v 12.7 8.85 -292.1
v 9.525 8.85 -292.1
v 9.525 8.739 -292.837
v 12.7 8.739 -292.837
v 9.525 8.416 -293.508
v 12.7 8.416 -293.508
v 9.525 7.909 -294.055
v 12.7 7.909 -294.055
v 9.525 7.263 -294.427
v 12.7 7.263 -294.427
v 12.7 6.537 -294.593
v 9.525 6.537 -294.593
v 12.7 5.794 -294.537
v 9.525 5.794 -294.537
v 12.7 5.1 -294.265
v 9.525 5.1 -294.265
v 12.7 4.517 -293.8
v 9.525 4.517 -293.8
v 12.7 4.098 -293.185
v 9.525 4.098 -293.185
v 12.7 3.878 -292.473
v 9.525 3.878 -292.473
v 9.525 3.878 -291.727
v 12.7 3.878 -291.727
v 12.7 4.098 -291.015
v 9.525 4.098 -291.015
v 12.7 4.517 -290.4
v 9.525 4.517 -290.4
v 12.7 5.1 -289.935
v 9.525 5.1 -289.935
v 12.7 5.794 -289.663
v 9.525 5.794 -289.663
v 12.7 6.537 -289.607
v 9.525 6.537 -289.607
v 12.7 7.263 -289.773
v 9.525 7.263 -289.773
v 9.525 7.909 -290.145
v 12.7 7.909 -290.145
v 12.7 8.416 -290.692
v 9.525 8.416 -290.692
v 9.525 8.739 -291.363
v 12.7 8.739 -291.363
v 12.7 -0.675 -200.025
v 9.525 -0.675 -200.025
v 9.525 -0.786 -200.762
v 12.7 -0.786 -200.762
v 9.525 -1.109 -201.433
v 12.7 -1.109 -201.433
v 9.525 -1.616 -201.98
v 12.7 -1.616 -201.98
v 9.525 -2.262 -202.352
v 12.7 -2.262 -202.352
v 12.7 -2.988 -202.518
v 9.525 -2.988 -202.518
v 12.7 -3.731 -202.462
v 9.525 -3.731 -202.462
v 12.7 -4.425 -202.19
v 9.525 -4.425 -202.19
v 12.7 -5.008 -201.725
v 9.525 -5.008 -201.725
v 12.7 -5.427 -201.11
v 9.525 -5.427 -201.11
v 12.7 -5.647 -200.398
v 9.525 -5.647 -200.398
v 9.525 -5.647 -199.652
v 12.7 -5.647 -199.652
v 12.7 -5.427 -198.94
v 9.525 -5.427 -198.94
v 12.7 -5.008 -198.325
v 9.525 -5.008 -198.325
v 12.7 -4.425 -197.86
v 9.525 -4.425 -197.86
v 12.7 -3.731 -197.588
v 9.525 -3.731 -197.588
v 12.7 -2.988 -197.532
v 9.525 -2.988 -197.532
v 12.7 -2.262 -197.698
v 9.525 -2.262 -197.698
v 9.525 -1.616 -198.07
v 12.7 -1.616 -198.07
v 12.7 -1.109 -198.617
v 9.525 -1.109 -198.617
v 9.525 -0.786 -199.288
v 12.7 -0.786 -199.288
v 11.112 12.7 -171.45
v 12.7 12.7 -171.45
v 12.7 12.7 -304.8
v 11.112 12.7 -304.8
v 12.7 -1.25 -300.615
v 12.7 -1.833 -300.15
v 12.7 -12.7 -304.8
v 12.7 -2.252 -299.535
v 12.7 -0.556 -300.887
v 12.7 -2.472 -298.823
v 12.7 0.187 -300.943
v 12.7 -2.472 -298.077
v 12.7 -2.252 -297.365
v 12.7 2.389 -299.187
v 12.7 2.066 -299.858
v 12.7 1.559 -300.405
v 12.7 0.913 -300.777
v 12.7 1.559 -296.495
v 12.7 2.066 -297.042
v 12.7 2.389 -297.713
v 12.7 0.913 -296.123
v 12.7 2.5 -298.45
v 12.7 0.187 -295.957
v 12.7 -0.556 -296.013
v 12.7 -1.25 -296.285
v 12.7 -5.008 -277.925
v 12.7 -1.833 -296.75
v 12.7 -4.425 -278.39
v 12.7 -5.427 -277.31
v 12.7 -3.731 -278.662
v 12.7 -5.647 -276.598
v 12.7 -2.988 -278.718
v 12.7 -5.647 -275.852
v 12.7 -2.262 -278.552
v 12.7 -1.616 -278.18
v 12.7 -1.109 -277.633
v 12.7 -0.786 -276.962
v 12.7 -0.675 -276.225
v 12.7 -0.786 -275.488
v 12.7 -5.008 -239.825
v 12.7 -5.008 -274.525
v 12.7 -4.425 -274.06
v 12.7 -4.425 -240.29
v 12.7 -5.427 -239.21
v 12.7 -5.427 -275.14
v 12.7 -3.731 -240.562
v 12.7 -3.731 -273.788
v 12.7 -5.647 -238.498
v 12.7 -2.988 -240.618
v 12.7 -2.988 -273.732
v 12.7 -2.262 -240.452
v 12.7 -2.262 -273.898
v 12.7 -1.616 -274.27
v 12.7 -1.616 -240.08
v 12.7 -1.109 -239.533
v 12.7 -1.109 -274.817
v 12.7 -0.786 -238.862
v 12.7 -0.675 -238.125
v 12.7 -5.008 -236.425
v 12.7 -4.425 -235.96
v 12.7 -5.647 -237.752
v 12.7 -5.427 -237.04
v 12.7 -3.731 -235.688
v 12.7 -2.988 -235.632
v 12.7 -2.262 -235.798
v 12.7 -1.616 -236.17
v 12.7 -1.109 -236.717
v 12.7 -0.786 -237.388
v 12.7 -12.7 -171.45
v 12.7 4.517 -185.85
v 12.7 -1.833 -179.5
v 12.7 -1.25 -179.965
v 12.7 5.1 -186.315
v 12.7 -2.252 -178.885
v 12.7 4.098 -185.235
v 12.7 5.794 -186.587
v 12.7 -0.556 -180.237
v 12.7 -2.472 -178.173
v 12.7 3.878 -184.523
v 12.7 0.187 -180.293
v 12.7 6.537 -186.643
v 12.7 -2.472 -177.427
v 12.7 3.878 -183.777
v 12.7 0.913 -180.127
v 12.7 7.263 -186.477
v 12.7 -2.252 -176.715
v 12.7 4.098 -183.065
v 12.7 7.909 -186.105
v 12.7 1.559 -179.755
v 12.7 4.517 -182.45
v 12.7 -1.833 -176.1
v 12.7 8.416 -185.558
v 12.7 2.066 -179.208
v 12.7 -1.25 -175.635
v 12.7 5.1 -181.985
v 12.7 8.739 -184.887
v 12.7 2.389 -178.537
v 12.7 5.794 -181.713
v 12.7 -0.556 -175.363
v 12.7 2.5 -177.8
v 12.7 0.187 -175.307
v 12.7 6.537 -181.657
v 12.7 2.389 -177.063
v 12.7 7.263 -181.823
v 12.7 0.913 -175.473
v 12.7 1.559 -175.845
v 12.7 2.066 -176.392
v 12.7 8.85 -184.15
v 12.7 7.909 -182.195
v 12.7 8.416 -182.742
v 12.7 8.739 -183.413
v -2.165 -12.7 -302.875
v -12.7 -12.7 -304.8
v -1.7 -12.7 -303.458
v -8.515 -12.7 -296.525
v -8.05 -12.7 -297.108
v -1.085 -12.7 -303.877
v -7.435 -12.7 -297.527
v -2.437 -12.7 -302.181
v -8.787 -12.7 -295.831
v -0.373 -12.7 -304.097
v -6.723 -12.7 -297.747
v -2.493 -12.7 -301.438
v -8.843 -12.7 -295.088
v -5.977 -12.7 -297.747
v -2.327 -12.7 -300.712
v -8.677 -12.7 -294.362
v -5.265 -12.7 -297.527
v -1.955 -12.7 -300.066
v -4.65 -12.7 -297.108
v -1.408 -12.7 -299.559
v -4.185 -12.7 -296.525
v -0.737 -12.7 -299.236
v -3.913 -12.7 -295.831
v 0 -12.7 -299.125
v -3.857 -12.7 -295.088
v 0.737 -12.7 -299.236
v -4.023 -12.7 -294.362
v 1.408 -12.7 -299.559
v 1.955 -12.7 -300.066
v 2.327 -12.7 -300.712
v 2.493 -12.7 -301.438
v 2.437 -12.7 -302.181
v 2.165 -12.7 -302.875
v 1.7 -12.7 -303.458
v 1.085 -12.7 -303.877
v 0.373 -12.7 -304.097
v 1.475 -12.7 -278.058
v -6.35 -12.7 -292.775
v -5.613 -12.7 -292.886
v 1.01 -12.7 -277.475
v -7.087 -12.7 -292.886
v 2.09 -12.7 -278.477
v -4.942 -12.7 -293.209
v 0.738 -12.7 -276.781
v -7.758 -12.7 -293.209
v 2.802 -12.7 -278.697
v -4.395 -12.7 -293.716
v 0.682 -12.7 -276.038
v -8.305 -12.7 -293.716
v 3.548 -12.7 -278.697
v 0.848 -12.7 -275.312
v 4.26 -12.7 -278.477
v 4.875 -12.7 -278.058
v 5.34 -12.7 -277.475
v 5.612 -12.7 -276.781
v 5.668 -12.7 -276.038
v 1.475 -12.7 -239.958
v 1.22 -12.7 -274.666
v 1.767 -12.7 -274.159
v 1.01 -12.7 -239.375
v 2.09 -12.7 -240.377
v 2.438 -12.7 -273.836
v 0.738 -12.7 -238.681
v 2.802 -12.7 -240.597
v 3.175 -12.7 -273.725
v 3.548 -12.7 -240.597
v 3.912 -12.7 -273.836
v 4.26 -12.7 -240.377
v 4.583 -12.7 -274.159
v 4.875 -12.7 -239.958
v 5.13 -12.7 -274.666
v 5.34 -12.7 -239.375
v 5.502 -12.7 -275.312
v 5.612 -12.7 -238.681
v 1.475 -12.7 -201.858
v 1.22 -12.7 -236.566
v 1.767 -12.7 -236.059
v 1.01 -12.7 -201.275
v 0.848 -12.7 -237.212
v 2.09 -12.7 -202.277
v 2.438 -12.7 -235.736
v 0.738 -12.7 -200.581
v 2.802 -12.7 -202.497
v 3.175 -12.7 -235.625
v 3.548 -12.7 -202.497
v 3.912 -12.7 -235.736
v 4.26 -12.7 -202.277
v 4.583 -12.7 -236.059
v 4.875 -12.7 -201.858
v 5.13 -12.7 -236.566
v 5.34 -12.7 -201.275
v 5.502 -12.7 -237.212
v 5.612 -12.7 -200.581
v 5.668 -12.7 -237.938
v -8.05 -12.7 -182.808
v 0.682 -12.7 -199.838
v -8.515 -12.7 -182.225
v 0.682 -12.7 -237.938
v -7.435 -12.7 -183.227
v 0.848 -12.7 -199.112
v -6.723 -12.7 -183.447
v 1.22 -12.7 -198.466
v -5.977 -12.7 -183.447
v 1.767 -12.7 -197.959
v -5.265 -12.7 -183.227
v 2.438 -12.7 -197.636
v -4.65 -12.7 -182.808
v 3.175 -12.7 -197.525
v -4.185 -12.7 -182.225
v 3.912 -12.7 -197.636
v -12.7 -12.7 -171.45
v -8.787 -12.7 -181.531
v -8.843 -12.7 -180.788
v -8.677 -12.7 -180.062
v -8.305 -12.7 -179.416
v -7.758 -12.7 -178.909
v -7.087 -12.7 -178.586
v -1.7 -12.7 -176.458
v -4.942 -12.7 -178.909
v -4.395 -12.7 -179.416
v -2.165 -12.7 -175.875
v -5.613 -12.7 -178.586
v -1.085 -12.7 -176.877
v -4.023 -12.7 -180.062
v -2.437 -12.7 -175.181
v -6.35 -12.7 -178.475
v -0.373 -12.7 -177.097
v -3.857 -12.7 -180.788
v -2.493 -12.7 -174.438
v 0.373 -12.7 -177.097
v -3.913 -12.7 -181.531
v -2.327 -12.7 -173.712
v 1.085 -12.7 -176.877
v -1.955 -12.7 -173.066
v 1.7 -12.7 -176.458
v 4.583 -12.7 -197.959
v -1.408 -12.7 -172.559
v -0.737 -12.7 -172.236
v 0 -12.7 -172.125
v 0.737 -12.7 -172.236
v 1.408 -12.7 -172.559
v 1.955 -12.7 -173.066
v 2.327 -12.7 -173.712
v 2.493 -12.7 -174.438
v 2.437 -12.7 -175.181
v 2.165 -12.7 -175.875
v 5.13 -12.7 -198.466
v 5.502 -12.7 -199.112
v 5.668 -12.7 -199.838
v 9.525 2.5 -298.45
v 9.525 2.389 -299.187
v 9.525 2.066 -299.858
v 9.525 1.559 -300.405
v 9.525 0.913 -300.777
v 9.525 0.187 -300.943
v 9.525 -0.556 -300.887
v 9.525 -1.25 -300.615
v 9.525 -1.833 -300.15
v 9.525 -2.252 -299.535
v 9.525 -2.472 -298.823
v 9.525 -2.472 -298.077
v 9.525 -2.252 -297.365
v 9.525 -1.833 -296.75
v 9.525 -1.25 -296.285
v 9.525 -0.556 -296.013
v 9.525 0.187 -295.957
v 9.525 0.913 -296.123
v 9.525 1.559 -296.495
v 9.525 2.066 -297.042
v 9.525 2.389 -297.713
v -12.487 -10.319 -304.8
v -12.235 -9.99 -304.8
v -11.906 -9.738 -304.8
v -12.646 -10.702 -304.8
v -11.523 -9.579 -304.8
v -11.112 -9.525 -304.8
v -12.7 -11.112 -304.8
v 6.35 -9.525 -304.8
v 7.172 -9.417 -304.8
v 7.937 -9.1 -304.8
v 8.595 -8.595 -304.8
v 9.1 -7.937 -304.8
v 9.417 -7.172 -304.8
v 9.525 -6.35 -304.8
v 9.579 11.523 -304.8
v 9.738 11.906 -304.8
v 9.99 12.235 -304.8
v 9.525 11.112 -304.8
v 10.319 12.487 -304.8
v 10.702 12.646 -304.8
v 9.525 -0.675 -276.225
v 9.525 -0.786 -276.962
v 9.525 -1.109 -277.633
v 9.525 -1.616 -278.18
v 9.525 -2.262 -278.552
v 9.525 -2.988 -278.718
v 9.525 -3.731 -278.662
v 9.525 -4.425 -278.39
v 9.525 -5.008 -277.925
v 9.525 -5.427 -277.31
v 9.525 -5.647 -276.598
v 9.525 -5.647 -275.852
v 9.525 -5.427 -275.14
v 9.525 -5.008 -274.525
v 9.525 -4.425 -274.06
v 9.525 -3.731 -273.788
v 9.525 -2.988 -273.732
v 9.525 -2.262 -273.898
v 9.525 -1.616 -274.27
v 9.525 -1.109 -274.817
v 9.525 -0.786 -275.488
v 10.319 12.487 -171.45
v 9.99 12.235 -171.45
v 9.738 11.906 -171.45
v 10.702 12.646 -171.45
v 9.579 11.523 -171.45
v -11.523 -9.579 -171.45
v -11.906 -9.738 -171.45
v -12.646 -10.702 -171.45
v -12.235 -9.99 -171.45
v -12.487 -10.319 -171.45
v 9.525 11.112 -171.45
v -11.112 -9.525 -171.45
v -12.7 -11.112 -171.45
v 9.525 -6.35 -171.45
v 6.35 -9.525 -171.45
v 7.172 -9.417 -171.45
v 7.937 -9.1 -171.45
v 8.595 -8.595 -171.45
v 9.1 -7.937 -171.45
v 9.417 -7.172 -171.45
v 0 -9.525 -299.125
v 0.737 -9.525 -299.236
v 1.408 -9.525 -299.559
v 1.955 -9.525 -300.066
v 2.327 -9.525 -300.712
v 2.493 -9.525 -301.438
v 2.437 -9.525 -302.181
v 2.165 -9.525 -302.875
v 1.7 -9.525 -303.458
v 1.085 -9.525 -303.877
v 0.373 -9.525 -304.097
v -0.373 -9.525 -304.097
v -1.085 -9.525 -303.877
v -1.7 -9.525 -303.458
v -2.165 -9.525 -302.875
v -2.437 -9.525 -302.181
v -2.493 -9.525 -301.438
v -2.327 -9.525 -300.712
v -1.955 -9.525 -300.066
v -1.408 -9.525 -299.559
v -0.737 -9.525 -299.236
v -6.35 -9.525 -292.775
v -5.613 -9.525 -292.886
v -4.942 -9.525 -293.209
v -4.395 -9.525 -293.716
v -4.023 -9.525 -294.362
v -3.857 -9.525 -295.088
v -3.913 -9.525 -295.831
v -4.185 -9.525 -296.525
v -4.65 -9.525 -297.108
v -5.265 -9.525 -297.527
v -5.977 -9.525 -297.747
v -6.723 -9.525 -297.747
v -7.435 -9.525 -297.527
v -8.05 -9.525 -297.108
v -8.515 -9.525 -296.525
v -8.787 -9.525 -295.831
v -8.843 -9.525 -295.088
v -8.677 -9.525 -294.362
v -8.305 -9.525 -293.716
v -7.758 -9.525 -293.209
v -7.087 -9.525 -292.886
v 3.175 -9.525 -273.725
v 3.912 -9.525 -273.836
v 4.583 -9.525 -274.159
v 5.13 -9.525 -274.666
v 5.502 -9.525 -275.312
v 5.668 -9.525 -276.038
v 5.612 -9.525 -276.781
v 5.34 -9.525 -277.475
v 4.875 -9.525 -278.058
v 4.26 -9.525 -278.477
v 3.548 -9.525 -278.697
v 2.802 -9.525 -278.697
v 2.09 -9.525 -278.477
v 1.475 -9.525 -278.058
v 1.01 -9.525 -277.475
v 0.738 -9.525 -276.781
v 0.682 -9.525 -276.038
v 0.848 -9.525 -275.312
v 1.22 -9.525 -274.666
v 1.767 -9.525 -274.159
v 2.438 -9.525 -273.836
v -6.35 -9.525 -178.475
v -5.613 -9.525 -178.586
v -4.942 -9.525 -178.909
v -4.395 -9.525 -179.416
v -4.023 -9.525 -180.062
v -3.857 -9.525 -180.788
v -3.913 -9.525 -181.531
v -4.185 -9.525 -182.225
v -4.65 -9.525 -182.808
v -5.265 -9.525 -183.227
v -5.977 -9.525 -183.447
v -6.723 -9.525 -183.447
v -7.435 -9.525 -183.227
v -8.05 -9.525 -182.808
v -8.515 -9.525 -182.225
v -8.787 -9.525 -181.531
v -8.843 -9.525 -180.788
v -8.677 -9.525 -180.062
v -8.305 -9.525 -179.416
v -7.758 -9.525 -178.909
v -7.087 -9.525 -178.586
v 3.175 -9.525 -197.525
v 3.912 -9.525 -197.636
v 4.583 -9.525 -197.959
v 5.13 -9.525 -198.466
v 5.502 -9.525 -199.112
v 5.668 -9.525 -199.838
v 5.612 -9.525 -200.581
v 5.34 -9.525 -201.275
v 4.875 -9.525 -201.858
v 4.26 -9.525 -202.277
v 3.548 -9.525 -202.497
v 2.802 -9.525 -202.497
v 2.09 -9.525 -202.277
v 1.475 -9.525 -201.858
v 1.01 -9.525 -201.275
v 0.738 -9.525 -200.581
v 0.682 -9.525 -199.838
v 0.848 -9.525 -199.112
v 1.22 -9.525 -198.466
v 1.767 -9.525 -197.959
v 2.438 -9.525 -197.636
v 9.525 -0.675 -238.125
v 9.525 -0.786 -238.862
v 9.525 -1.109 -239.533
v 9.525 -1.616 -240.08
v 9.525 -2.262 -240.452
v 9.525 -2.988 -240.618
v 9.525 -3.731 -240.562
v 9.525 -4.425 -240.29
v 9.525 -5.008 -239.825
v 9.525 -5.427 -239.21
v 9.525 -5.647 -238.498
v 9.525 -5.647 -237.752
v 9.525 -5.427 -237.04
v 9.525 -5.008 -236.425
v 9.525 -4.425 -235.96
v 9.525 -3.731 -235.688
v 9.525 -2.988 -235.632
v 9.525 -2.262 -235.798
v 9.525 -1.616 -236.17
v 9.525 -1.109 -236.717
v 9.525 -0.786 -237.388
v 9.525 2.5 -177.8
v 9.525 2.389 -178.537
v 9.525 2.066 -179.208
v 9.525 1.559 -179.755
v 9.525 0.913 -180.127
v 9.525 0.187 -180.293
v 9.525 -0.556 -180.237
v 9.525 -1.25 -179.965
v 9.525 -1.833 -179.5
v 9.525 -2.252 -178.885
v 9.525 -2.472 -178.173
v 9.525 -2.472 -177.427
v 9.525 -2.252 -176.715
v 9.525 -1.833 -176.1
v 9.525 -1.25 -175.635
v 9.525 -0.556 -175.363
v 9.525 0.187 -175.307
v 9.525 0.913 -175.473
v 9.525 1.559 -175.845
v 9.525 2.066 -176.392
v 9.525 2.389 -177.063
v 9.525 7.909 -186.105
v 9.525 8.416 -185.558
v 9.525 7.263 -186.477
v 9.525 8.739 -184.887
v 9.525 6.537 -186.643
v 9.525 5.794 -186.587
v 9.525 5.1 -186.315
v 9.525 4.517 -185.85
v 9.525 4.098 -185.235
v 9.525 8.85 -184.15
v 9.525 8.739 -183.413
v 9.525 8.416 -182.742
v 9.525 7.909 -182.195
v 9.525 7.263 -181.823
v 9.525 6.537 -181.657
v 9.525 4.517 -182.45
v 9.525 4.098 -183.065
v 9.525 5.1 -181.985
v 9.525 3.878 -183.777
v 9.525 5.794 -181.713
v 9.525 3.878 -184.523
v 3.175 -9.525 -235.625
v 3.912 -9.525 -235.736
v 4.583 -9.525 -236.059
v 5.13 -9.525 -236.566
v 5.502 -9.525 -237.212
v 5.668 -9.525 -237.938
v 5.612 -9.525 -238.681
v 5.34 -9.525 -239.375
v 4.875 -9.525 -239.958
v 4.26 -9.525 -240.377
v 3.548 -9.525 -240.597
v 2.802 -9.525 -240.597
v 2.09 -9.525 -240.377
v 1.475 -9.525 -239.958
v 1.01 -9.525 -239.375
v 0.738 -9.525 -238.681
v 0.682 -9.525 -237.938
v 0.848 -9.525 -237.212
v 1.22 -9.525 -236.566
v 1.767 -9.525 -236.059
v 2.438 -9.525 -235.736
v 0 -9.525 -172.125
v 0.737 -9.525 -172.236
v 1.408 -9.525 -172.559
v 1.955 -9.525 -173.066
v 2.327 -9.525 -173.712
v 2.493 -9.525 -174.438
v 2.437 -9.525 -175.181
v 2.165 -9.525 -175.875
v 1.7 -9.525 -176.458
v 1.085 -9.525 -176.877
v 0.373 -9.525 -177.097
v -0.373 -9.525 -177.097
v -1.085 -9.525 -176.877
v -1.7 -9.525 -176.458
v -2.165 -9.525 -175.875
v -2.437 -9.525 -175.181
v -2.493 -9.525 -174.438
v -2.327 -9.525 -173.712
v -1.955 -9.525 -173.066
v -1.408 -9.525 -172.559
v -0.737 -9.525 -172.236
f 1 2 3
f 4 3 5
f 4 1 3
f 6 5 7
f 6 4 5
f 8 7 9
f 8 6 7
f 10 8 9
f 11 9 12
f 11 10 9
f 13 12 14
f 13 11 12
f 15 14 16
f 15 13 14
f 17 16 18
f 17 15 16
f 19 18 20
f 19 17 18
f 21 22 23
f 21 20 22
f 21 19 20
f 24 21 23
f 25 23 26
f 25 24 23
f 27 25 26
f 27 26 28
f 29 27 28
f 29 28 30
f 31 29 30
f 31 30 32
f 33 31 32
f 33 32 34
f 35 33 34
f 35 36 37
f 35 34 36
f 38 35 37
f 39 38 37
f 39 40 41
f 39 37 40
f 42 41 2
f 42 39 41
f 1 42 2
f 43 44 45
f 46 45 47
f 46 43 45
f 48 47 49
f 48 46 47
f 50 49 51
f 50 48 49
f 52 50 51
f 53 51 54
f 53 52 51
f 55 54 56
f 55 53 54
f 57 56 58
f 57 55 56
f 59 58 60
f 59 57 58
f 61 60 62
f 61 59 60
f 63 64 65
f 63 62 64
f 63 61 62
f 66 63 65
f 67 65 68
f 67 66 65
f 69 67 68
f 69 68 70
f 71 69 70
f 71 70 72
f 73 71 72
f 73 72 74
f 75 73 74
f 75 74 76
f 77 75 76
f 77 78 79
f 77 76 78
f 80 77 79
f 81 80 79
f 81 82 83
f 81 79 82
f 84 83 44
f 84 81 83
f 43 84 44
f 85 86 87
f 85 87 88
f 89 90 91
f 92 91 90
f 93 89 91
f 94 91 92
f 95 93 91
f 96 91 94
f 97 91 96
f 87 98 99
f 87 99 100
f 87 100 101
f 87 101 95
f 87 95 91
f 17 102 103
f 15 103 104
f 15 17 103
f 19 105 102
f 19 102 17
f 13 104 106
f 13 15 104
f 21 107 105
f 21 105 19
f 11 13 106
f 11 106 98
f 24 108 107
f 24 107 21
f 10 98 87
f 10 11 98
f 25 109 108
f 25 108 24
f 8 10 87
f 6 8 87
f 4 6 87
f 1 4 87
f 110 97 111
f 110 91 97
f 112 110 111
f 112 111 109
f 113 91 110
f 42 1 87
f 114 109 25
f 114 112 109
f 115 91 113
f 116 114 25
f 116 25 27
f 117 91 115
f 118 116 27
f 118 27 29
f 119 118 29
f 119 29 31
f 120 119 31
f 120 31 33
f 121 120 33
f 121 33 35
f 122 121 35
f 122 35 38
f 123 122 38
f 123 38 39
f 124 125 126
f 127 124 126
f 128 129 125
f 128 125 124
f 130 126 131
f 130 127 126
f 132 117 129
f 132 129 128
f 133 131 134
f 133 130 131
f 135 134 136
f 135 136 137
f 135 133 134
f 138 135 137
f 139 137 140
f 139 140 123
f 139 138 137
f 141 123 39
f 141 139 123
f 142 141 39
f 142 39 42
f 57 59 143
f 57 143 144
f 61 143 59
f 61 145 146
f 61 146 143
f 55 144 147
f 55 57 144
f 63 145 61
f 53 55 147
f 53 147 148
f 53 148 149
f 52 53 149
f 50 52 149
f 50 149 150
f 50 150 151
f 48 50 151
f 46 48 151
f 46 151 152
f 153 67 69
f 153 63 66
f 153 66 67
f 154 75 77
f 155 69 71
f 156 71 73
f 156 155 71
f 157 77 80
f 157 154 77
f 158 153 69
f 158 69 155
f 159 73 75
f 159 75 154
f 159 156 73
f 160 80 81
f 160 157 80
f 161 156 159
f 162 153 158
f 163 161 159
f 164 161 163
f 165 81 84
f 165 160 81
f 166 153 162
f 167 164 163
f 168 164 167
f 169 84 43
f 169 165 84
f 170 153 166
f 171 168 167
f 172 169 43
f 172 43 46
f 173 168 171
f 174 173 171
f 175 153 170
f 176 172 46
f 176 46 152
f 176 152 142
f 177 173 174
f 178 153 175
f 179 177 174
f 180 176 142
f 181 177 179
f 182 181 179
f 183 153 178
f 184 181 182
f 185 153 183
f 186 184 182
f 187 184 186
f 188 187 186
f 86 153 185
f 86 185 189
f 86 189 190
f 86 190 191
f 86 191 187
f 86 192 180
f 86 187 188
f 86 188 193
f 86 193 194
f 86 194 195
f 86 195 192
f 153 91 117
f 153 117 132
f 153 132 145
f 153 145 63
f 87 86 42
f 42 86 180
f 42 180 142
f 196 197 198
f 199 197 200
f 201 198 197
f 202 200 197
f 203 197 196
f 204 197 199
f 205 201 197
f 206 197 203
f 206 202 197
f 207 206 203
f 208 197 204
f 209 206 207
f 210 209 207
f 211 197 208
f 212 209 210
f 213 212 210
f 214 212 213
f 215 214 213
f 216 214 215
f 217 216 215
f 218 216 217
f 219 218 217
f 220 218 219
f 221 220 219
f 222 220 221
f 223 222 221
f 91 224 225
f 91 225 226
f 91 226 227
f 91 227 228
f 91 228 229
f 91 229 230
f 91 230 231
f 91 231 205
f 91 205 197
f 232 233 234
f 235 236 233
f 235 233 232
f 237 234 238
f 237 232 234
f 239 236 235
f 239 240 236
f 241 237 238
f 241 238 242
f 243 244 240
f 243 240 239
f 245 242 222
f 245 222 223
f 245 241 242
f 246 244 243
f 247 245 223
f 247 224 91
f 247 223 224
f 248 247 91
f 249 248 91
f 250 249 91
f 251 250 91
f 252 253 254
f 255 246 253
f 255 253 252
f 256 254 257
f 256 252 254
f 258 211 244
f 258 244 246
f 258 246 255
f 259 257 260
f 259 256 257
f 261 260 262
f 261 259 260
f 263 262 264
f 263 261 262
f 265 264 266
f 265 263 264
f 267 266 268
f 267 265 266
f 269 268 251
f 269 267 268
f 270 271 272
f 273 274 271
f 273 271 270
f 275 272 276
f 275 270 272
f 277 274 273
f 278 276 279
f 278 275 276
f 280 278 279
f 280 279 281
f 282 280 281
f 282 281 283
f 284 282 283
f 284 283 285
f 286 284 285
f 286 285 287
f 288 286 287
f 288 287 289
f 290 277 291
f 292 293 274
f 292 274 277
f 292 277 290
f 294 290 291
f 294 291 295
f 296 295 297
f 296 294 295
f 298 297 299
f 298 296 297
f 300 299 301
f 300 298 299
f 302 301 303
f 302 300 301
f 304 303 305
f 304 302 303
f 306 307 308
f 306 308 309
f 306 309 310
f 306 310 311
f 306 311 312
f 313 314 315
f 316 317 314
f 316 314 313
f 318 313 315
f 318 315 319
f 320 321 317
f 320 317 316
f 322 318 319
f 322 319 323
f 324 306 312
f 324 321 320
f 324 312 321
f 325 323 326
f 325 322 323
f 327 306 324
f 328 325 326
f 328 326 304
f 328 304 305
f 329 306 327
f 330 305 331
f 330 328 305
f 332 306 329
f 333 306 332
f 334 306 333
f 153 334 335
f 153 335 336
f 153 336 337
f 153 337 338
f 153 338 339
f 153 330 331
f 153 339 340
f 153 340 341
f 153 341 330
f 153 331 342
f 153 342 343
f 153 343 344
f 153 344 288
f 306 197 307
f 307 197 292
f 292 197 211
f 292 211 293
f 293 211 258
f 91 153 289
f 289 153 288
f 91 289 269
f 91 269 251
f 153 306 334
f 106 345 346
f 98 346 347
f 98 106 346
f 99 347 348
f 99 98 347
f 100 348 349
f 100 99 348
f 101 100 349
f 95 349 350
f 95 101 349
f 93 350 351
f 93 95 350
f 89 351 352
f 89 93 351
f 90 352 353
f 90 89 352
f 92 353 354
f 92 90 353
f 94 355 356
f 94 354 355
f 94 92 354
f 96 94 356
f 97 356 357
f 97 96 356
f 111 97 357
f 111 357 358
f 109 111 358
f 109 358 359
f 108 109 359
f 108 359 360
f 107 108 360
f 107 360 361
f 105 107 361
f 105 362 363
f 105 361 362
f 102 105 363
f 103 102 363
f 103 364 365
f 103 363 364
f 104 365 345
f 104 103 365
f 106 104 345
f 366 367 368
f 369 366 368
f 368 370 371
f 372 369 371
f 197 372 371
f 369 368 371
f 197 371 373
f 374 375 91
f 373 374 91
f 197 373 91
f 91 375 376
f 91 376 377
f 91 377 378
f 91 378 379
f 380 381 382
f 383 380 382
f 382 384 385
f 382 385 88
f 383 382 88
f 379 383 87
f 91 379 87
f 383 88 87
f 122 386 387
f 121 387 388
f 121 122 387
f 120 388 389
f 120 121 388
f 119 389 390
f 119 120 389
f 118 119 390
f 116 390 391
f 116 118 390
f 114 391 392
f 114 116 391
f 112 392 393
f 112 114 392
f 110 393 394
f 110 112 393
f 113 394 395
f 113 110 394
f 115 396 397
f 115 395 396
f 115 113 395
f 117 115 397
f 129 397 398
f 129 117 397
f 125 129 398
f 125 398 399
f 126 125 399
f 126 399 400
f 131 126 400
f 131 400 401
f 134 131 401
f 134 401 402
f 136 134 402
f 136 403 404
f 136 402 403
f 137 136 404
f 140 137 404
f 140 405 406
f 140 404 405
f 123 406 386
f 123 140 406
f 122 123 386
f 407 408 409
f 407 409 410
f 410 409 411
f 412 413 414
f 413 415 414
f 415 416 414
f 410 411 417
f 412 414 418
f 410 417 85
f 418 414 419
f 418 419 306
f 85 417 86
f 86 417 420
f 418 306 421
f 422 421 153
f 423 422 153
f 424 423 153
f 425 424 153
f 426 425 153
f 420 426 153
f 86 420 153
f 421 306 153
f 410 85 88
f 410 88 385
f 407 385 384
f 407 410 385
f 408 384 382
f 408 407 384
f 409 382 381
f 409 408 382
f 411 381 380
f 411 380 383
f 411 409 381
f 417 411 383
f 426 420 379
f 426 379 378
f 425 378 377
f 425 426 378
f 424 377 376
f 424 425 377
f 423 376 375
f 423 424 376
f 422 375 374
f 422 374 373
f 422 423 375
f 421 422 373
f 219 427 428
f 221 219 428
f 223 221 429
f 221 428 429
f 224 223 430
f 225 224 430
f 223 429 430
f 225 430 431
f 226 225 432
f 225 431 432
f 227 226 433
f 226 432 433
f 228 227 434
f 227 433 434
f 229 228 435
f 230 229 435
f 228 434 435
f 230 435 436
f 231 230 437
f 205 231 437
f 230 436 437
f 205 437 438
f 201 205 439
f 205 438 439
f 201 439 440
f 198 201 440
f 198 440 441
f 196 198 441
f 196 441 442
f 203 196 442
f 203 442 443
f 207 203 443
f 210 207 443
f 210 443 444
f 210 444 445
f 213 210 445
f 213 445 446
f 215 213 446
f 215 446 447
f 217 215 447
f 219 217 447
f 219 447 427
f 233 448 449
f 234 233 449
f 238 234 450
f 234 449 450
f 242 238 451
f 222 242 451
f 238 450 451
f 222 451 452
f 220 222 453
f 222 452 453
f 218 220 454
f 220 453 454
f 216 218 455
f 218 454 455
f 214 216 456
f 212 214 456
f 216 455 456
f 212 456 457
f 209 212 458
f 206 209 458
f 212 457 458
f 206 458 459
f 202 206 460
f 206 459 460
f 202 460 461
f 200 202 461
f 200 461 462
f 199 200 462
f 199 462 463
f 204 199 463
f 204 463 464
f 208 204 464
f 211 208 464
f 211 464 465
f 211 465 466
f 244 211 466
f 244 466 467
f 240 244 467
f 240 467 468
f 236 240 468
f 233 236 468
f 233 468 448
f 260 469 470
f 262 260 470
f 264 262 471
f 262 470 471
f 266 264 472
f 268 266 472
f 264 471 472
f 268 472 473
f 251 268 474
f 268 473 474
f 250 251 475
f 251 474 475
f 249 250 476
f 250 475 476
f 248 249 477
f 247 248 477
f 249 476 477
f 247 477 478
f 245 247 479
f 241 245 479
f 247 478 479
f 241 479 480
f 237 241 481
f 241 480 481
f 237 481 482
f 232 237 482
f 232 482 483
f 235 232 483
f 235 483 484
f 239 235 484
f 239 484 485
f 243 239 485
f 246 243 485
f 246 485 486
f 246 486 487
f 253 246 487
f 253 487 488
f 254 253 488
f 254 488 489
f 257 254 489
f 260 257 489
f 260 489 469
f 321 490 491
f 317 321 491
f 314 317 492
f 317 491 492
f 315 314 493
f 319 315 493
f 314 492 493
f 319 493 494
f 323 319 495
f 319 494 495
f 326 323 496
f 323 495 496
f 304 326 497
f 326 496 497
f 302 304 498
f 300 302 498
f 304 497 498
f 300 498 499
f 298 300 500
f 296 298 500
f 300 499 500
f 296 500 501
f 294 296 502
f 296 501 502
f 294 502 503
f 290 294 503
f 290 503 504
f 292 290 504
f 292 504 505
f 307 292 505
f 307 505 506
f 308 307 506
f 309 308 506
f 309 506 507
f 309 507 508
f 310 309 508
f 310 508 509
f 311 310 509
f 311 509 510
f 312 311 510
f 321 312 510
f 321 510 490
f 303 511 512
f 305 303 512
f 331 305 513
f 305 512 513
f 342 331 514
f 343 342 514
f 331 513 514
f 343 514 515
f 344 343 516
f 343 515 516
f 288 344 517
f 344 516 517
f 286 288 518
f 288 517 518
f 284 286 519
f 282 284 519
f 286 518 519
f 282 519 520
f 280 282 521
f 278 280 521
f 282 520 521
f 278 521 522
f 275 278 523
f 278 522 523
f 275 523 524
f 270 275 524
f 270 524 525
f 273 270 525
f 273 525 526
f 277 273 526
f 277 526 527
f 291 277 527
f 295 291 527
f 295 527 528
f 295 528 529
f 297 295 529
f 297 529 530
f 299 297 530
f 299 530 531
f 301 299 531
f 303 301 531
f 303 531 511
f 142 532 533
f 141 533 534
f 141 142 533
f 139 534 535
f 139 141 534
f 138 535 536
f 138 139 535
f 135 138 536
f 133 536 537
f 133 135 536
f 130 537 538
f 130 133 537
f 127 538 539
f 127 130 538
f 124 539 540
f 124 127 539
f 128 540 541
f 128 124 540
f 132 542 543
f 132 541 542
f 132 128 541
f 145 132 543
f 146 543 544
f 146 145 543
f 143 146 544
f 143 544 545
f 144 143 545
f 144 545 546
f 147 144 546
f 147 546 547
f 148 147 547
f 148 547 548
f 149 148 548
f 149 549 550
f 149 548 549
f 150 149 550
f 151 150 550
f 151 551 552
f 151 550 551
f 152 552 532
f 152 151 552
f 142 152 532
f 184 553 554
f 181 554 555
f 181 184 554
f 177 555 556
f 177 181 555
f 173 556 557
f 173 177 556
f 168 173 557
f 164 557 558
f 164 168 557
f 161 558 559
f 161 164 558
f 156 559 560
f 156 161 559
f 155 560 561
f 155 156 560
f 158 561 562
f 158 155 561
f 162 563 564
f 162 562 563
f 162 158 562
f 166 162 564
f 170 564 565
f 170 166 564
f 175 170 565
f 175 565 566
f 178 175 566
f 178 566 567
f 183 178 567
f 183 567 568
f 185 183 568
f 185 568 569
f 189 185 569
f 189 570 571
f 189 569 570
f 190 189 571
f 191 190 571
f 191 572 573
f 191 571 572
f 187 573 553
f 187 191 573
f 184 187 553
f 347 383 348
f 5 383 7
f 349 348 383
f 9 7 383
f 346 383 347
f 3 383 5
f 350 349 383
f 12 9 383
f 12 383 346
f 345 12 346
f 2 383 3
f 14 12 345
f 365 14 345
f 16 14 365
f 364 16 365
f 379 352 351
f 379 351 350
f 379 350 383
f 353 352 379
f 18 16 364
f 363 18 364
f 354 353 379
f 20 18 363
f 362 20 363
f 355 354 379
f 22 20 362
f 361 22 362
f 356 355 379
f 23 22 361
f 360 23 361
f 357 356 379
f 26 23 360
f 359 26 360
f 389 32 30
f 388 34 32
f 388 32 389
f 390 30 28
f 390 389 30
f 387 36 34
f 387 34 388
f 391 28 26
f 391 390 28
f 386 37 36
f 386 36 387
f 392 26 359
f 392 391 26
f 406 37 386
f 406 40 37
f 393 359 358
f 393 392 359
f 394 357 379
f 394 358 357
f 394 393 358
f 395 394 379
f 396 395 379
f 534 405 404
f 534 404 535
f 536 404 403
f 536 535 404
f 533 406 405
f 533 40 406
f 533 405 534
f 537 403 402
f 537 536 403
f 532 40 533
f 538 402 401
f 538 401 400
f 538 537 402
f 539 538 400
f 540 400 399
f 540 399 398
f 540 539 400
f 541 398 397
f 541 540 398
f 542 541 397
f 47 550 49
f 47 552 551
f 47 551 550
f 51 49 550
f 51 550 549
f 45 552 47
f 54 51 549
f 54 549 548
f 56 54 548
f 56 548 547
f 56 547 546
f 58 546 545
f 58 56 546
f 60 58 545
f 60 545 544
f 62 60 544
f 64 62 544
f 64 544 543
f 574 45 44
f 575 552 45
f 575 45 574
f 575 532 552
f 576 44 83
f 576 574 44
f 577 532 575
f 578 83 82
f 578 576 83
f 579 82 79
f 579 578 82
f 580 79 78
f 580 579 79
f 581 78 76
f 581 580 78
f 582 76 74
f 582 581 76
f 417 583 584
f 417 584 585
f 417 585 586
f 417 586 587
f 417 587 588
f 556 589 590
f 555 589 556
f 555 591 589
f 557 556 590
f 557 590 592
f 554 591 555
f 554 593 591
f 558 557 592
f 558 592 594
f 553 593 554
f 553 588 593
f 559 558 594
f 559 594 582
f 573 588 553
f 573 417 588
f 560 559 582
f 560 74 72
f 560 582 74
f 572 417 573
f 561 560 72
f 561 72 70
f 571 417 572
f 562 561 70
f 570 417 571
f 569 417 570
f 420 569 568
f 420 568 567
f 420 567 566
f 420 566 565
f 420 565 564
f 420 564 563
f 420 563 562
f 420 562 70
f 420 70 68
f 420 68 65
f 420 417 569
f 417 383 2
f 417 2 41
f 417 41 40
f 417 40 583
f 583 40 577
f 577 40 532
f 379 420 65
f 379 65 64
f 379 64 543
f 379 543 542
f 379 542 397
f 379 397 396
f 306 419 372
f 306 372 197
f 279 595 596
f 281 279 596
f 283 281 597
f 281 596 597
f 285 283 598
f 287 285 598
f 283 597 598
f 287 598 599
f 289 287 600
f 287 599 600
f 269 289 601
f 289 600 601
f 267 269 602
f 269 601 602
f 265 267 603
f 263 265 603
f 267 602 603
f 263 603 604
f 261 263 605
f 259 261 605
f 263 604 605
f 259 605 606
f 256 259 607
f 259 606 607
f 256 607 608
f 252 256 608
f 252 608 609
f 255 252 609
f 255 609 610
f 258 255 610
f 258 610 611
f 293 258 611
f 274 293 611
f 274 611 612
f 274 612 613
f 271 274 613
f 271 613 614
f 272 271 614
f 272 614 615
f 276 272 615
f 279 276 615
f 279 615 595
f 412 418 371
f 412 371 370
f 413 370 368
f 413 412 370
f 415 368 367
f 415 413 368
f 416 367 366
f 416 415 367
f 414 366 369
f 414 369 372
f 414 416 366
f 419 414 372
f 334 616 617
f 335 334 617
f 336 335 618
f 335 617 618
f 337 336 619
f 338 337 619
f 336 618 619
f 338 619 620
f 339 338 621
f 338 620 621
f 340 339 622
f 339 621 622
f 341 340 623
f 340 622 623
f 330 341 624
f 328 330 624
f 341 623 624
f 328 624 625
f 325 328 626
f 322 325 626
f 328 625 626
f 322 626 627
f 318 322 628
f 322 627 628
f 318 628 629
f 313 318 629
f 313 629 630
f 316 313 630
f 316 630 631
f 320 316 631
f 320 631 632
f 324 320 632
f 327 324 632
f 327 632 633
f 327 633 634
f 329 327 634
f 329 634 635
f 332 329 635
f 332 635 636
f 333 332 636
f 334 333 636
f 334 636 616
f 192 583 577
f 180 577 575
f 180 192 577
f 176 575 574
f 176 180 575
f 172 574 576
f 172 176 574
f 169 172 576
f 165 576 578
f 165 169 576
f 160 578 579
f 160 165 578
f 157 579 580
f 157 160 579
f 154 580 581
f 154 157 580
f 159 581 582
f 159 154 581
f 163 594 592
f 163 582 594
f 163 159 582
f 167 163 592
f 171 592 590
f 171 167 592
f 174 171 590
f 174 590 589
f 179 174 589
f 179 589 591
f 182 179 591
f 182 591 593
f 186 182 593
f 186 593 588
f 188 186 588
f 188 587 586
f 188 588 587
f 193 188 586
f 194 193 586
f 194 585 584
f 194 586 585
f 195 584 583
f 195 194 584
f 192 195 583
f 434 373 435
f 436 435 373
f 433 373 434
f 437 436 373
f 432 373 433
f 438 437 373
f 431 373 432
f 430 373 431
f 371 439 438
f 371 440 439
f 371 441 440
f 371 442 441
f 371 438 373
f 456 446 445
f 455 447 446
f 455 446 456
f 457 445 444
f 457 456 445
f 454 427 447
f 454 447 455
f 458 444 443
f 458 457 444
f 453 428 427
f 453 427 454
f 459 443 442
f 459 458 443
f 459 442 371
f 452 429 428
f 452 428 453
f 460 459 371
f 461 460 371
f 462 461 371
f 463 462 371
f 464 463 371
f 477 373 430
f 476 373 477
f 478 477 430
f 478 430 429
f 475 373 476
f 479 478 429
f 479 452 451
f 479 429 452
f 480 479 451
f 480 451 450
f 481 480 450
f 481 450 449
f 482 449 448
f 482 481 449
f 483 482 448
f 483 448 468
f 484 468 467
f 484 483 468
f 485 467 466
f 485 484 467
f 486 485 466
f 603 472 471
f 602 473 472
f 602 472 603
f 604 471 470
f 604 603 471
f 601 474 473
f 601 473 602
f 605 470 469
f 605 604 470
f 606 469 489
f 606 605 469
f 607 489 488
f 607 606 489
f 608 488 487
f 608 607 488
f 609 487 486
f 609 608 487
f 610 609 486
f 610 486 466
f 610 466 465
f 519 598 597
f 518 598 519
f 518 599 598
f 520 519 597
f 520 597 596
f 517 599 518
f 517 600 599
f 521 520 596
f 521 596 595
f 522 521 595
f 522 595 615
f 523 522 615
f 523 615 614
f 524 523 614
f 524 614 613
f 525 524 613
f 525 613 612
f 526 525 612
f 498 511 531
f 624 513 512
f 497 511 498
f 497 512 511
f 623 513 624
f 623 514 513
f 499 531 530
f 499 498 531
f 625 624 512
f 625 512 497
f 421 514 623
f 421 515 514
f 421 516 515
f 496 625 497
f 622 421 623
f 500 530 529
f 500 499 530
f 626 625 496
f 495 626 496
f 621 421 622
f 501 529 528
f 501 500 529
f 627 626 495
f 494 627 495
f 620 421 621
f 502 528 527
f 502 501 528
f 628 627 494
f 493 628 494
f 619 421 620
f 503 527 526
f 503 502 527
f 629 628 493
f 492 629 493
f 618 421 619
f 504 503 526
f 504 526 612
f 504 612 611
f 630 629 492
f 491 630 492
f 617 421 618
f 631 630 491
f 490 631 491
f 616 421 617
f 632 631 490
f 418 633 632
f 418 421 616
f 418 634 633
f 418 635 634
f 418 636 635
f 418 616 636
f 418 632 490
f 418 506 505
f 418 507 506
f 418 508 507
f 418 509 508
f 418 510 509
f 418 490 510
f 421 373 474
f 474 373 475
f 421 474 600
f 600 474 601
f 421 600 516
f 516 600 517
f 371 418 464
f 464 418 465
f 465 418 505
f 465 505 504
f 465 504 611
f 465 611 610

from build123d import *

# Parameters (mm, degrees)
BOSS_EXTRUDE1_DEPTH = 304.8
SKETCH7_W           = 25.4
SKETCH7_H           = 476.25
CUT_EXTRUDE1_DEPTH  = 254
SKETCH3_R           = 2.5
CUT_EXTRUDE2_DEPTH  = 254
SKETCH8_R           = 2.5
CUT_EXTRUDE4_DEPTH  = 254


with BuildPart() as part:
    # Sketch2 → Boss-Extrude1 (new, symmetric)
    with BuildSketch(Plane.XY):
        with BuildLine():
            Line((-12.7, -12.7), (12.7, -12.7))
            Line((12.7, -12.7), (12.7, 12.7))
            Line((12.7, 12.7), (11.1125, 12.7))
            ThreePointArc((11.1125, 12.7), (9.989967985, 12.235032015), (9.525, 11.1125))
            Line((9.525, 11.1125), (9.525, -6.35))
            ThreePointArc((9.525, -6.35), (8.59506403, -8.59506403), (6.35, -9.525))
            Line((6.35, -9.525), (-11.1125, -9.525))
            ThreePointArc((-11.1125, -9.525), (-12.235032015, -9.989967985), (-12.7, -11.1125))
            Line((-12.7, -11.1125), (-12.7, -12.7))
        make_face()
    extrude(amount=BOSS_EXTRUDE1_DEPTH, both=True)

    # Sketch7 → Cut-Extrude1 (cut)
    with BuildSketch(Plane.XZ.offset(12.7)):
        with Locations((0, 66.675)):
            Rectangle(SKETCH7_W, SKETCH7_H)
    extrude(amount=-CUT_EXTRUDE1_DEPTH, mode=Mode.SUBTRACT)

    # Sketch3 → Cut-Extrude2 (cut)
    with BuildSketch(Plane(origin=(0, 0, 0), x_dir=(1, 0, 0), z_dir=(0, 1, 0))):
        with Locations(Location((-6.35, 295.275, 0), (0, 0, 270))):
            Circle(SKETCH3_R)
        with Locations(Location((0, 301.625, 0), (0, 0, 270))):
            Circle(SKETCH3_R)
        with Locations(Location((3.175, 276.225, 0), (0, 0, 270))):
            Circle(SKETCH3_R)
        with Locations(Location((3.175, 238.125, 0), (0, 0, 270))):
            Circle(SKETCH3_R)
        with Locations(Location((3.175, 200.025, 0), (0, 0, 270))):
            Circle(SKETCH3_R)
        with Locations(Location((0, 174.625, 0), (0, 0, 270))):
            Circle(SKETCH3_R)
        with Locations(Location((-6.35, 180.975, 0), (0, 0, 270))):
            Circle(SKETCH3_R)
    extrude(amount=-CUT_EXTRUDE2_DEPTH, mode=Mode.SUBTRACT)

    # Sketch8 → Cut-Extrude4 (cut)
    with BuildSketch(Plane(origin=(12.7, 0, -12.7), x_dir=(0, 0, 1), z_dir=(-1, 0, 0))):
        with Locations(Location((-171.45, 6.35, 0), (0, 0, 90))):
            Circle(SKETCH8_R)
        with Locations(Location((-165.1, 0, 0), (0, 0, 90))):
            Circle(SKETCH8_R)
        with Locations(Location((-187.325, -3.175, 0), (0, 0, 90))):
            Circle(SKETCH8_R)
        with Locations(Location((-225.425, -3.175, 0), (0, 0, 90))):
            Circle(SKETCH8_R)
        with Locations(Location((-263.525, -3.175, 0), (0, 0, 90))):
            Circle(SKETCH8_R)
        with Locations(Location((-285.75, 0, 0), (0, 0, 90))):
            Circle(SKETCH8_R)
        with Locations(Location((-279.4, 6.35, 0), (0, 0, 90))):
            Circle(SKETCH8_R)
    extrude(amount=CUT_EXTRUDE4_DEPTH, mode=Mode.SUBTRACT)


solid = part.part
